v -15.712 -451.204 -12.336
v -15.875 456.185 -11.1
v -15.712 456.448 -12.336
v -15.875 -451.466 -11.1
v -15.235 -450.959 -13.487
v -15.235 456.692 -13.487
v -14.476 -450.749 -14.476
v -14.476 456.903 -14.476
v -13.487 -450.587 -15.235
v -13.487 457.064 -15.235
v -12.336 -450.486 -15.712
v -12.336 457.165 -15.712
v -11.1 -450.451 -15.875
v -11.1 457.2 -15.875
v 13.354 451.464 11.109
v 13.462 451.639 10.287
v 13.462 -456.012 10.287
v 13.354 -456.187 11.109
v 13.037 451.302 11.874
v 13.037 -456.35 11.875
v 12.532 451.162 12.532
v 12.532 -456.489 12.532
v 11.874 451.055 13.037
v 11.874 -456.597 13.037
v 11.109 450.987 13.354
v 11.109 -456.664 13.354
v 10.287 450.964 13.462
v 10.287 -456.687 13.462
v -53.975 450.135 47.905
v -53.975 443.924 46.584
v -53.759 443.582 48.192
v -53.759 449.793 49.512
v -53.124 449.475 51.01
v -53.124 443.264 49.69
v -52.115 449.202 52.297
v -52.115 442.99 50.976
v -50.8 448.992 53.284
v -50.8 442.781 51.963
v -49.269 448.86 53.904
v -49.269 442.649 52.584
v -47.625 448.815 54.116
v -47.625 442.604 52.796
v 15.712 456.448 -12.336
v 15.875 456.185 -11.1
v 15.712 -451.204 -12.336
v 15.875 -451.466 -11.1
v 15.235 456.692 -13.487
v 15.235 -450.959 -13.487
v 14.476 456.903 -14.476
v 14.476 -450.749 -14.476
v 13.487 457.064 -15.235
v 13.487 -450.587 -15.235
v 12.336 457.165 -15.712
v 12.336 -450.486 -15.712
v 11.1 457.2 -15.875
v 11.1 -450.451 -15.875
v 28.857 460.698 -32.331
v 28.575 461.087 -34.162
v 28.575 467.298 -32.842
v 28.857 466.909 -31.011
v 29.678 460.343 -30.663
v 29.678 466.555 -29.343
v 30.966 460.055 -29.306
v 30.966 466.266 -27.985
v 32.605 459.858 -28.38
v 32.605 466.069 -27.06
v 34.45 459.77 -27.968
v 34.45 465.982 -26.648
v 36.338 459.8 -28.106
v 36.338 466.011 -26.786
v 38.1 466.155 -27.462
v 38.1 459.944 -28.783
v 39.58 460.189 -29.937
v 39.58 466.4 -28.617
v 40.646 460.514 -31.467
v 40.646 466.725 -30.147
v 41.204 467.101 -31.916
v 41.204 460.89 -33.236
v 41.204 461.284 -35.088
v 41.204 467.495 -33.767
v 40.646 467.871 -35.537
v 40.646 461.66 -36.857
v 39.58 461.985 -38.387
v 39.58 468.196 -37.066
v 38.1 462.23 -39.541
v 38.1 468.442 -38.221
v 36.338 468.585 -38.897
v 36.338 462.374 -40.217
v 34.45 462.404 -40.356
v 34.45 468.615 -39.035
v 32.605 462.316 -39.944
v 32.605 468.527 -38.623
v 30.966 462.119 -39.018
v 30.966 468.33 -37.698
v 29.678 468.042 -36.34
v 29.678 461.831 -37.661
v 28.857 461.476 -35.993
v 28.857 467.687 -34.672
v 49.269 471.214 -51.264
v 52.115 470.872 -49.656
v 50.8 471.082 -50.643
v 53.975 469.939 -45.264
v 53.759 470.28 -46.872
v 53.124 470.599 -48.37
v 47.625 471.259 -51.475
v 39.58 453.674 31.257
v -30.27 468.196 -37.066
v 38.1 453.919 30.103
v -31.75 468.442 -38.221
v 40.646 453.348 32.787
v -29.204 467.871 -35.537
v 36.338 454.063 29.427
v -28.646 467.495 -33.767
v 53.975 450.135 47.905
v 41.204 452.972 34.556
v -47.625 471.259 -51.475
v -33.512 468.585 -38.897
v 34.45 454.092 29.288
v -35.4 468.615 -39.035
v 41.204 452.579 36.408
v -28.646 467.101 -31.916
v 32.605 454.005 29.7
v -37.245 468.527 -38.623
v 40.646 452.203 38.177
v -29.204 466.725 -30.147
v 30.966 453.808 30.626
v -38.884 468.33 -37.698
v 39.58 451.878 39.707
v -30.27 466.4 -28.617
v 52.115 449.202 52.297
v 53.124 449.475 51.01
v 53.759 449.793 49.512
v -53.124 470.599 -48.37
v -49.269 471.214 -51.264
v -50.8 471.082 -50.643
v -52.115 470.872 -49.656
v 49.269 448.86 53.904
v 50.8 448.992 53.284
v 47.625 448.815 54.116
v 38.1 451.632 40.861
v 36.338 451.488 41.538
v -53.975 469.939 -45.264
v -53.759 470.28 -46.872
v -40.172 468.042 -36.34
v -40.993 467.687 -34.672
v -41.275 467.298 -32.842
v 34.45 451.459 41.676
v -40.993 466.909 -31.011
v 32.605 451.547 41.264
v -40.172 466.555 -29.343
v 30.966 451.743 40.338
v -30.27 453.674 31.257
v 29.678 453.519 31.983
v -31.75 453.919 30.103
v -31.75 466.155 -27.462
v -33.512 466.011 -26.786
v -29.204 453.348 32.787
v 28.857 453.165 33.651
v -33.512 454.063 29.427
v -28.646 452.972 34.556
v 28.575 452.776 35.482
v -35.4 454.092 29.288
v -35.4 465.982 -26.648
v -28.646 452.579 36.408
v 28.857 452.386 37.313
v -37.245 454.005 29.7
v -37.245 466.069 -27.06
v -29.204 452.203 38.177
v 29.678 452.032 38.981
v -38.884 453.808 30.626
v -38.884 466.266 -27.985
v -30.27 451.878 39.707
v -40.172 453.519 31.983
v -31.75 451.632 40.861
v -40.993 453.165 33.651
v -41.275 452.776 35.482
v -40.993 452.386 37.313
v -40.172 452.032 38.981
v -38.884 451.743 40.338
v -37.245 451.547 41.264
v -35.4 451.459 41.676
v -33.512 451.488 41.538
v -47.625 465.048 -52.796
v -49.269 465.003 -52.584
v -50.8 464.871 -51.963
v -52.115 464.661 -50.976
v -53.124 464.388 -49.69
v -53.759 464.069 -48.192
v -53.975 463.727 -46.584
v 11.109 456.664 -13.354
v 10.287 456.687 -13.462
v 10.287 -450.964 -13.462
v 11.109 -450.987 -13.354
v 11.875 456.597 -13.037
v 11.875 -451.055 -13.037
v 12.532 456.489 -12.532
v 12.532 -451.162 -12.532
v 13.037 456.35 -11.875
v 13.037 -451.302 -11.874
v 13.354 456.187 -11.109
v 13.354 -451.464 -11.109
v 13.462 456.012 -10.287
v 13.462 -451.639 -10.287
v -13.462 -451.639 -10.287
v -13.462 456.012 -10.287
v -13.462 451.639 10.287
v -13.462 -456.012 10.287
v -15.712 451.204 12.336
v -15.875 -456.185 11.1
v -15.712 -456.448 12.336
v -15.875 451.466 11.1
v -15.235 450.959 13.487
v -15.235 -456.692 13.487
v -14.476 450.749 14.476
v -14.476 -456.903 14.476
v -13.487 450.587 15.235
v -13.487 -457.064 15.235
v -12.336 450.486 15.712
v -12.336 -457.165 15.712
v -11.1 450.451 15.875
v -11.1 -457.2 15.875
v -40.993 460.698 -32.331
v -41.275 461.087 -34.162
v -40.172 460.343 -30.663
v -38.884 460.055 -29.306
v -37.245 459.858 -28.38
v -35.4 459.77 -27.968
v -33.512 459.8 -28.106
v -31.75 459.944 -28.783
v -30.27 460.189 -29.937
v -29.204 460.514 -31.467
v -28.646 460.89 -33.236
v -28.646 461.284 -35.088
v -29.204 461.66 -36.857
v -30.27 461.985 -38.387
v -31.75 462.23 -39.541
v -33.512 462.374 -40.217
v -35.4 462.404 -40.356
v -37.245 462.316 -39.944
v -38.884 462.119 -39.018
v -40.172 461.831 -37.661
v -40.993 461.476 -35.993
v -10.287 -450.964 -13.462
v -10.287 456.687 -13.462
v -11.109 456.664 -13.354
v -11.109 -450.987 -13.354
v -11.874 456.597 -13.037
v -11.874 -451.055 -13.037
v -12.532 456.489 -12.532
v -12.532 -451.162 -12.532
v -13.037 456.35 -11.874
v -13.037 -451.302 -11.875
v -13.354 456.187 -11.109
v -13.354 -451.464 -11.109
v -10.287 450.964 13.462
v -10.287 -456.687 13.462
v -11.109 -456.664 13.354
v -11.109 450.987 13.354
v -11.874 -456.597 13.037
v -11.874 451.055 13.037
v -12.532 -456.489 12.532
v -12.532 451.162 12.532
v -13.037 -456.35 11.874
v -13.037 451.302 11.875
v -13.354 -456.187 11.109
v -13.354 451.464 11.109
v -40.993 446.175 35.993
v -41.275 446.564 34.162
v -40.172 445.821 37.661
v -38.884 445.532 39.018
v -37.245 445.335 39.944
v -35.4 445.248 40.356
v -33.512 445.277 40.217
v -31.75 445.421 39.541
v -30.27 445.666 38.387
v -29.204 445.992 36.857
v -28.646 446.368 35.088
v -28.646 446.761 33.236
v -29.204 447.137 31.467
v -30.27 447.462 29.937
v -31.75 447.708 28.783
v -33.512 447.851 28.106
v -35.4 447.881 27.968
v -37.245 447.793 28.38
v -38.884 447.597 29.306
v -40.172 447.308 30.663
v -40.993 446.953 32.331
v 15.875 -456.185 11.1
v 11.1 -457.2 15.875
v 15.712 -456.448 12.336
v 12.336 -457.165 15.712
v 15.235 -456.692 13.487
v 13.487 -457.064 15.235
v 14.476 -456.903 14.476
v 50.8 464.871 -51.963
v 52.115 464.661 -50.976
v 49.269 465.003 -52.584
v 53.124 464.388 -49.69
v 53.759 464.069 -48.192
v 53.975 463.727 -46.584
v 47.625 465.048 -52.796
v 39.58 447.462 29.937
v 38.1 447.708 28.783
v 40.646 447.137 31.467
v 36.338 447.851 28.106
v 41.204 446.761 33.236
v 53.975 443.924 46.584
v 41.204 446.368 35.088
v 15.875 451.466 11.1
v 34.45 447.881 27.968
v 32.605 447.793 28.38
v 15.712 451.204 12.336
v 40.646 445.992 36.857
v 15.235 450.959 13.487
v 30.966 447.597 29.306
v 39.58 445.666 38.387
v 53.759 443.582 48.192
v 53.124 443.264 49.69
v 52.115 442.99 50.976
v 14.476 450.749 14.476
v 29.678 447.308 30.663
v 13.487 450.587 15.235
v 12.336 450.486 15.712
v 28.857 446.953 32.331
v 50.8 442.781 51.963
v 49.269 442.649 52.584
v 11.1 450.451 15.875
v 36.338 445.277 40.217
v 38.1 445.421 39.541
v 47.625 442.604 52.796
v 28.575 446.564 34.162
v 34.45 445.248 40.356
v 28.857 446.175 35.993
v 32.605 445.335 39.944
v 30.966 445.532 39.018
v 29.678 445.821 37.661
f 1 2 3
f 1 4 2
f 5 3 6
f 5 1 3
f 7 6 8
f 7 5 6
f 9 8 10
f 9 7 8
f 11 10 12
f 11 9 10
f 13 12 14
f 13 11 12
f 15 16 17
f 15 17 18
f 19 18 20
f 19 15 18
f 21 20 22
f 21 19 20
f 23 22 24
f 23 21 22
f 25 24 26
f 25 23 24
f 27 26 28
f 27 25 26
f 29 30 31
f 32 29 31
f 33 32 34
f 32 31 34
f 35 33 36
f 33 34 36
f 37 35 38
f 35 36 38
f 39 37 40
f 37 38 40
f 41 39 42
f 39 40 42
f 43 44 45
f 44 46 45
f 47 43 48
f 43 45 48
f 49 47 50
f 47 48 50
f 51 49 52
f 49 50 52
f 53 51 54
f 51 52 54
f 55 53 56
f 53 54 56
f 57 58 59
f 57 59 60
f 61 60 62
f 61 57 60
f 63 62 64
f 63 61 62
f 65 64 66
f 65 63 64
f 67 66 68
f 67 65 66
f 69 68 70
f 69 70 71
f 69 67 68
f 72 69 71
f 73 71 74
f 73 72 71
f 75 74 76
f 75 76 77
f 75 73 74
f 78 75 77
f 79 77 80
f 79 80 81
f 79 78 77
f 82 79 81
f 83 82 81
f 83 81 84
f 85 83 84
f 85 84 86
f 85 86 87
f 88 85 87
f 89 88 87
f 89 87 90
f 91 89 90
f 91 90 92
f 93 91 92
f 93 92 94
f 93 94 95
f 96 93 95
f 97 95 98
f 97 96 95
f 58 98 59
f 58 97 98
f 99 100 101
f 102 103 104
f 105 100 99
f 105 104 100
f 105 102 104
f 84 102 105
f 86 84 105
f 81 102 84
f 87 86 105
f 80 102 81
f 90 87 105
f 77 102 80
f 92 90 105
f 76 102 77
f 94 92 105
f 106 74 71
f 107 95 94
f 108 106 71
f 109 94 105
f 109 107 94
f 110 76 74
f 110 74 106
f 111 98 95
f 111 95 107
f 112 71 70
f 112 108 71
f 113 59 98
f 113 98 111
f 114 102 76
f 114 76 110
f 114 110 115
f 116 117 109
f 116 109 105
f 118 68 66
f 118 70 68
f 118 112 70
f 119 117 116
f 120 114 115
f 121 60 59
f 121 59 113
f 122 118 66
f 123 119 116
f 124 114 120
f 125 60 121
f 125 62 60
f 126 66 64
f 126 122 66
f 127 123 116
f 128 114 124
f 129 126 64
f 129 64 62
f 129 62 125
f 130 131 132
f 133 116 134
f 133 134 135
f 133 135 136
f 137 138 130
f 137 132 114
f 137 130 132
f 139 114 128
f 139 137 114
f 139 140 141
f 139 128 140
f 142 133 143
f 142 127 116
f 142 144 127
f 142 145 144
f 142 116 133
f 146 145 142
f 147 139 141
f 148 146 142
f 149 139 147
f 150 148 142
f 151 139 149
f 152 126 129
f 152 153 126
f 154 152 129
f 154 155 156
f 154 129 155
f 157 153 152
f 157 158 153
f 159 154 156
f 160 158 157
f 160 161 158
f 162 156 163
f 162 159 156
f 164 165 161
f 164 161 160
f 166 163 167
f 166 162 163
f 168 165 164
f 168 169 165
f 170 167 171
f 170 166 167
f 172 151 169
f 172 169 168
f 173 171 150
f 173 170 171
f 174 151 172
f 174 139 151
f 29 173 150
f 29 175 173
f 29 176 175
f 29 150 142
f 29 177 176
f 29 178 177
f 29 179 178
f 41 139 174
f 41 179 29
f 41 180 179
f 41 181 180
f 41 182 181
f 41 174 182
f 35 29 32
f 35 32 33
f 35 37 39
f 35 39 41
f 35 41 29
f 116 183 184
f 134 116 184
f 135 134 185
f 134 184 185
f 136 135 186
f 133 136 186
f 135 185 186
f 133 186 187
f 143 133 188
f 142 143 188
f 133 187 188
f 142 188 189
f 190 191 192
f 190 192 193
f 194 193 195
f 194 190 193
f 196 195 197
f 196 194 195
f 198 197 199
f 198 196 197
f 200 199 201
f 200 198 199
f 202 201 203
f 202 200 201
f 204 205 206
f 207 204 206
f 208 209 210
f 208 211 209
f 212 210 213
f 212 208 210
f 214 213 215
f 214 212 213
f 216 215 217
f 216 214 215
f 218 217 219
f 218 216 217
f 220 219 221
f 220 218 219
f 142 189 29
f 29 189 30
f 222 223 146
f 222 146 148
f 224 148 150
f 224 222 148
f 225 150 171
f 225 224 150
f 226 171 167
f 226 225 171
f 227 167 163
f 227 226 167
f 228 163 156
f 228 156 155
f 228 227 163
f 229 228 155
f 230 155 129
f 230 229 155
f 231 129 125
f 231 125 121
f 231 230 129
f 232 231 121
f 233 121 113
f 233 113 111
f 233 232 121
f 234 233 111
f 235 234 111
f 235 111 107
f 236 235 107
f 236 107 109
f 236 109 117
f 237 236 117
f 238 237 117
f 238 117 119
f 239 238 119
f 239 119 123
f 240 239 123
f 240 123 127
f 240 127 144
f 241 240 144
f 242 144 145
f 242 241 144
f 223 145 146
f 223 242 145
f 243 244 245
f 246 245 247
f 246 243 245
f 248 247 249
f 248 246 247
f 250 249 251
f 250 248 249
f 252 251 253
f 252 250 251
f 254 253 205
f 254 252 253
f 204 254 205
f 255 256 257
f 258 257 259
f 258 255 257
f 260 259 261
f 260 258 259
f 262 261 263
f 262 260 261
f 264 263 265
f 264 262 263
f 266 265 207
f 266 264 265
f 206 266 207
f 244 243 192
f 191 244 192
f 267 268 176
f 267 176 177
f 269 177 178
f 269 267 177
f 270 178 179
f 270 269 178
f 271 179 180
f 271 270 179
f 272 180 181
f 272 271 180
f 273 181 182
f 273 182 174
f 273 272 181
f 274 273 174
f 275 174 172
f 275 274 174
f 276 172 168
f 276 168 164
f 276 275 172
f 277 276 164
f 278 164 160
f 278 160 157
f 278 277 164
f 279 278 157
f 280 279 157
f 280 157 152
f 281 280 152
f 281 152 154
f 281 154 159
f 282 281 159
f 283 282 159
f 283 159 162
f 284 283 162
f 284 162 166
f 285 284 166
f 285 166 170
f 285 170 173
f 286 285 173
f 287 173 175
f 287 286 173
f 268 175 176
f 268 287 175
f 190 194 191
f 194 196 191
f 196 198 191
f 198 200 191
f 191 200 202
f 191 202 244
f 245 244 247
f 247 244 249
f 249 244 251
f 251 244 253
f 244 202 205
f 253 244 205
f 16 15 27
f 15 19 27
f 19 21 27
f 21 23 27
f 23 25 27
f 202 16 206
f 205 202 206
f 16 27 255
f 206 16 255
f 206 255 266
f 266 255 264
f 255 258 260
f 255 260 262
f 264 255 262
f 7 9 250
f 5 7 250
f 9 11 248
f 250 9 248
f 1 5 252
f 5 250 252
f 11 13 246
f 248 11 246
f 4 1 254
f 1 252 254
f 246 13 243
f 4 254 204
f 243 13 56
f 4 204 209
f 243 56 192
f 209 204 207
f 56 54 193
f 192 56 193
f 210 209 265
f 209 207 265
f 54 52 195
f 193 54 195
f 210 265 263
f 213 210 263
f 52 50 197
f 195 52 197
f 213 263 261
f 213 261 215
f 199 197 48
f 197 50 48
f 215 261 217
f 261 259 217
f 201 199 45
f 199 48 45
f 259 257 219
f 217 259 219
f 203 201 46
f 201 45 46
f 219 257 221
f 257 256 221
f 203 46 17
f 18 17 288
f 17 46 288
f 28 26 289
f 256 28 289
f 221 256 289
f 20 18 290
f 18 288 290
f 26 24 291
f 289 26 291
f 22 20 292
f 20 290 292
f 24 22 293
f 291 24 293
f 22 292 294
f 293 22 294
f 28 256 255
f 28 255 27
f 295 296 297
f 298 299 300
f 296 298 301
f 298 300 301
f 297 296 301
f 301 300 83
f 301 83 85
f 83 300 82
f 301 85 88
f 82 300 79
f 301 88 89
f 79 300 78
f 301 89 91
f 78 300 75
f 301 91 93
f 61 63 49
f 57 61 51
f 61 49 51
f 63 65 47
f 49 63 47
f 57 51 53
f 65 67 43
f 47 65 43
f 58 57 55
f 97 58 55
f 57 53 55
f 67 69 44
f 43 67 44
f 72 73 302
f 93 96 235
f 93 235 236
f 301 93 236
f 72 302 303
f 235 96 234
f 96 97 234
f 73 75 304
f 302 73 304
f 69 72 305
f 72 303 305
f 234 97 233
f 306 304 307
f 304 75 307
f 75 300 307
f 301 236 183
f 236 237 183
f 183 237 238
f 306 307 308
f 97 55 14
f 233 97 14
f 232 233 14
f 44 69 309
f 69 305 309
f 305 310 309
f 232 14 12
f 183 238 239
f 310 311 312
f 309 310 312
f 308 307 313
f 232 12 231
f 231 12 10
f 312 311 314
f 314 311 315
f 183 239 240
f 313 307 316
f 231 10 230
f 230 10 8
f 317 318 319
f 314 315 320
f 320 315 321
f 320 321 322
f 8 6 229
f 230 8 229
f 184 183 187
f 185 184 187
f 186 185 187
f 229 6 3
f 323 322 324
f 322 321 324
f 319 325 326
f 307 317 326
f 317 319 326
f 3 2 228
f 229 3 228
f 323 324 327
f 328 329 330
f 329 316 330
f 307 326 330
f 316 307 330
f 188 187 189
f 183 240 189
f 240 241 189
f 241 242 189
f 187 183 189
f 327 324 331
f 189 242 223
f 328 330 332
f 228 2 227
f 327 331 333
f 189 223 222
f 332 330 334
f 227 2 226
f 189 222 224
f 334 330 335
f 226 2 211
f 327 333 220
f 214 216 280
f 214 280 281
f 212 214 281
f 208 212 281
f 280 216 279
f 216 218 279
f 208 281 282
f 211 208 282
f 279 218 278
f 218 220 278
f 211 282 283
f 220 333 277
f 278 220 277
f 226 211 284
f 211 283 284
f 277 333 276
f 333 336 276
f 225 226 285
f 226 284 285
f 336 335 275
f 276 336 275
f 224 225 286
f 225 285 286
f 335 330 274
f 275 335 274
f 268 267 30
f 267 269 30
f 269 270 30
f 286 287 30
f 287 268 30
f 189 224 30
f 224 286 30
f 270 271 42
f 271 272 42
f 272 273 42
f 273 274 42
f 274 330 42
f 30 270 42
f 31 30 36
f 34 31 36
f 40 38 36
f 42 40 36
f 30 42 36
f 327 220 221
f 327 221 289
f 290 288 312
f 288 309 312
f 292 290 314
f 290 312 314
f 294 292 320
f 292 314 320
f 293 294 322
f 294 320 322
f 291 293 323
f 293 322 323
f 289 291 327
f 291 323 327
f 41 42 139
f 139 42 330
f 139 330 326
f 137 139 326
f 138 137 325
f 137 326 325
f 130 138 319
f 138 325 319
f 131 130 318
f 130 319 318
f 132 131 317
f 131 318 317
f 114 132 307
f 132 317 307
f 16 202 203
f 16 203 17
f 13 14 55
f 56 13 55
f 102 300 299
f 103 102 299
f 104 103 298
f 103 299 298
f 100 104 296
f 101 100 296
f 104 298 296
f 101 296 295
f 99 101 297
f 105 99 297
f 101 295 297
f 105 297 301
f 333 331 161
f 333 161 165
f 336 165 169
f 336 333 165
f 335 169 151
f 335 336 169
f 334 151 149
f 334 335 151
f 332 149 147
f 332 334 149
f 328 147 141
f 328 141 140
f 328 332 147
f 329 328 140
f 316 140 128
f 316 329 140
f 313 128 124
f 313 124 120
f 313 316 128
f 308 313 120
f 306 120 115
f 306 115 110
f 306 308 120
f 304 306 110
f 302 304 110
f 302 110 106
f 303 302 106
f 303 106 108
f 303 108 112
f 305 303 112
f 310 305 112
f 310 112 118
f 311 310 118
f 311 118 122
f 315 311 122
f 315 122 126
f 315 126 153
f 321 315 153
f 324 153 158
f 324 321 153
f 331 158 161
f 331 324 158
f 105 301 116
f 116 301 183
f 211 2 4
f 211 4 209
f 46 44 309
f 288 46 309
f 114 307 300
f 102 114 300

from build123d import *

# Parameters (mm, degrees)
F0_W     = 31.75
F0_H     = 31.75
F0_W_2   = 26.924
F0_H_2   = 26.924
F1_DEPTH = 457.2
F2_R     = 4.7752
F3_R     = 3.175
F5_DEPTH = 31.751
F6_R     = 6.35
F7_DEPTH = 6.35


with BuildPart() as f1:
    # F0 (on Front) → F1 (new body, symmetric)
    with BuildSketch(Plane.XZ):
        Rectangle(F0_W, F0_H)
        Rectangle(F0_W_2, F0_H_2, mode=Mode.SUBTRACT)
    extrude(amount=F1_DEPTH, both=True)

    # F2
    f2_edges = [f1.edges().sort_by_distance(p)[0] for p in [
        (15.875, 0, -15.875),
        (-15.875, 0, -15.875),
        (-15.875, 0, 15.875),
        (15.875, 0, 15.875),
    ]]
    fillet(f2_edges, radius=F2_R)

    # F3
    f3_edges = [f1.edges().sort_by_distance(p)[0] for p in [
        (-13.462, 0, 13.462),
        (13.462, 0, 13.462),
        (-13.462, 0, -13.462),
        (13.462, 0, -13.462),
    ]]
    fillet(f3_edges, radius=F3_R)

    # F4 (on face) → F5 (cut, through all)
    with BuildSketch(Plane.YZ.offset(15.875)):
        Polygon((-450.451329167, -15.875), (-457.2, 15.875), (-457.2, -15.875), align=None)
        Polygon((457.2, 15.875), (450.451329167, 15.875), (457.2, -15.875), align=None)
    extrude(amount=-F5_DEPTH, mode=Mode.SUBTRACT)

    # F6 (on face) → F7 (join)
    with BuildSketch(Plane(origin=(0, 434.2080195127, 92.2937636772), x_dir=(-1, 0, 0), z_dir=(0, 0.9781476007, 0.2079116908))):
        with BuildLine():
            Line((-47.625, -148.33066126), (47.625, -148.33066126))
            ThreePointArc((47.625, -148.33066126), (52.1151280605, -146.4707893206), (53.975, -141.98066126))
            Line((53.975, -141.98066126), (53.975, -46.73066126))
            ThreePointArc((53.975, -46.73066126), (52.1151280605, -42.2405331995), (47.625, -40.38066126))
            Line((47.625, -40.38066126), (-47.625, -40.38066126))
            ThreePointArc((-47.625, -40.38066126), (-52.1151280605, -42.2405331995), (-53.975, -46.73066126))
            Line((-53.975, -46.73066126), (-53.975, -141.98066126))
            ThreePointArc((-53.975, -141.98066126), (-52.1151280605, -146.4707893206), (-47.625, -148.33066126))
        make_face()
        with Locations((-34.925, -129.28066126)):
            Circle(F6_R, mode=Mode.SUBTRACT)
        with Locations((34.925, -129.28066126)):
            Circle(F6_R, mode=Mode.SUBTRACT)
        with Locations((-34.925, -59.43066126)):
            Circle(F6_R, mode=Mode.SUBTRACT)
        with Locations((34.925, -59.43066126)):
            Circle(F6_R, mode=Mode.SUBTRACT)
    extrude(amount=F7_DEPTH)


solid = f1.part
